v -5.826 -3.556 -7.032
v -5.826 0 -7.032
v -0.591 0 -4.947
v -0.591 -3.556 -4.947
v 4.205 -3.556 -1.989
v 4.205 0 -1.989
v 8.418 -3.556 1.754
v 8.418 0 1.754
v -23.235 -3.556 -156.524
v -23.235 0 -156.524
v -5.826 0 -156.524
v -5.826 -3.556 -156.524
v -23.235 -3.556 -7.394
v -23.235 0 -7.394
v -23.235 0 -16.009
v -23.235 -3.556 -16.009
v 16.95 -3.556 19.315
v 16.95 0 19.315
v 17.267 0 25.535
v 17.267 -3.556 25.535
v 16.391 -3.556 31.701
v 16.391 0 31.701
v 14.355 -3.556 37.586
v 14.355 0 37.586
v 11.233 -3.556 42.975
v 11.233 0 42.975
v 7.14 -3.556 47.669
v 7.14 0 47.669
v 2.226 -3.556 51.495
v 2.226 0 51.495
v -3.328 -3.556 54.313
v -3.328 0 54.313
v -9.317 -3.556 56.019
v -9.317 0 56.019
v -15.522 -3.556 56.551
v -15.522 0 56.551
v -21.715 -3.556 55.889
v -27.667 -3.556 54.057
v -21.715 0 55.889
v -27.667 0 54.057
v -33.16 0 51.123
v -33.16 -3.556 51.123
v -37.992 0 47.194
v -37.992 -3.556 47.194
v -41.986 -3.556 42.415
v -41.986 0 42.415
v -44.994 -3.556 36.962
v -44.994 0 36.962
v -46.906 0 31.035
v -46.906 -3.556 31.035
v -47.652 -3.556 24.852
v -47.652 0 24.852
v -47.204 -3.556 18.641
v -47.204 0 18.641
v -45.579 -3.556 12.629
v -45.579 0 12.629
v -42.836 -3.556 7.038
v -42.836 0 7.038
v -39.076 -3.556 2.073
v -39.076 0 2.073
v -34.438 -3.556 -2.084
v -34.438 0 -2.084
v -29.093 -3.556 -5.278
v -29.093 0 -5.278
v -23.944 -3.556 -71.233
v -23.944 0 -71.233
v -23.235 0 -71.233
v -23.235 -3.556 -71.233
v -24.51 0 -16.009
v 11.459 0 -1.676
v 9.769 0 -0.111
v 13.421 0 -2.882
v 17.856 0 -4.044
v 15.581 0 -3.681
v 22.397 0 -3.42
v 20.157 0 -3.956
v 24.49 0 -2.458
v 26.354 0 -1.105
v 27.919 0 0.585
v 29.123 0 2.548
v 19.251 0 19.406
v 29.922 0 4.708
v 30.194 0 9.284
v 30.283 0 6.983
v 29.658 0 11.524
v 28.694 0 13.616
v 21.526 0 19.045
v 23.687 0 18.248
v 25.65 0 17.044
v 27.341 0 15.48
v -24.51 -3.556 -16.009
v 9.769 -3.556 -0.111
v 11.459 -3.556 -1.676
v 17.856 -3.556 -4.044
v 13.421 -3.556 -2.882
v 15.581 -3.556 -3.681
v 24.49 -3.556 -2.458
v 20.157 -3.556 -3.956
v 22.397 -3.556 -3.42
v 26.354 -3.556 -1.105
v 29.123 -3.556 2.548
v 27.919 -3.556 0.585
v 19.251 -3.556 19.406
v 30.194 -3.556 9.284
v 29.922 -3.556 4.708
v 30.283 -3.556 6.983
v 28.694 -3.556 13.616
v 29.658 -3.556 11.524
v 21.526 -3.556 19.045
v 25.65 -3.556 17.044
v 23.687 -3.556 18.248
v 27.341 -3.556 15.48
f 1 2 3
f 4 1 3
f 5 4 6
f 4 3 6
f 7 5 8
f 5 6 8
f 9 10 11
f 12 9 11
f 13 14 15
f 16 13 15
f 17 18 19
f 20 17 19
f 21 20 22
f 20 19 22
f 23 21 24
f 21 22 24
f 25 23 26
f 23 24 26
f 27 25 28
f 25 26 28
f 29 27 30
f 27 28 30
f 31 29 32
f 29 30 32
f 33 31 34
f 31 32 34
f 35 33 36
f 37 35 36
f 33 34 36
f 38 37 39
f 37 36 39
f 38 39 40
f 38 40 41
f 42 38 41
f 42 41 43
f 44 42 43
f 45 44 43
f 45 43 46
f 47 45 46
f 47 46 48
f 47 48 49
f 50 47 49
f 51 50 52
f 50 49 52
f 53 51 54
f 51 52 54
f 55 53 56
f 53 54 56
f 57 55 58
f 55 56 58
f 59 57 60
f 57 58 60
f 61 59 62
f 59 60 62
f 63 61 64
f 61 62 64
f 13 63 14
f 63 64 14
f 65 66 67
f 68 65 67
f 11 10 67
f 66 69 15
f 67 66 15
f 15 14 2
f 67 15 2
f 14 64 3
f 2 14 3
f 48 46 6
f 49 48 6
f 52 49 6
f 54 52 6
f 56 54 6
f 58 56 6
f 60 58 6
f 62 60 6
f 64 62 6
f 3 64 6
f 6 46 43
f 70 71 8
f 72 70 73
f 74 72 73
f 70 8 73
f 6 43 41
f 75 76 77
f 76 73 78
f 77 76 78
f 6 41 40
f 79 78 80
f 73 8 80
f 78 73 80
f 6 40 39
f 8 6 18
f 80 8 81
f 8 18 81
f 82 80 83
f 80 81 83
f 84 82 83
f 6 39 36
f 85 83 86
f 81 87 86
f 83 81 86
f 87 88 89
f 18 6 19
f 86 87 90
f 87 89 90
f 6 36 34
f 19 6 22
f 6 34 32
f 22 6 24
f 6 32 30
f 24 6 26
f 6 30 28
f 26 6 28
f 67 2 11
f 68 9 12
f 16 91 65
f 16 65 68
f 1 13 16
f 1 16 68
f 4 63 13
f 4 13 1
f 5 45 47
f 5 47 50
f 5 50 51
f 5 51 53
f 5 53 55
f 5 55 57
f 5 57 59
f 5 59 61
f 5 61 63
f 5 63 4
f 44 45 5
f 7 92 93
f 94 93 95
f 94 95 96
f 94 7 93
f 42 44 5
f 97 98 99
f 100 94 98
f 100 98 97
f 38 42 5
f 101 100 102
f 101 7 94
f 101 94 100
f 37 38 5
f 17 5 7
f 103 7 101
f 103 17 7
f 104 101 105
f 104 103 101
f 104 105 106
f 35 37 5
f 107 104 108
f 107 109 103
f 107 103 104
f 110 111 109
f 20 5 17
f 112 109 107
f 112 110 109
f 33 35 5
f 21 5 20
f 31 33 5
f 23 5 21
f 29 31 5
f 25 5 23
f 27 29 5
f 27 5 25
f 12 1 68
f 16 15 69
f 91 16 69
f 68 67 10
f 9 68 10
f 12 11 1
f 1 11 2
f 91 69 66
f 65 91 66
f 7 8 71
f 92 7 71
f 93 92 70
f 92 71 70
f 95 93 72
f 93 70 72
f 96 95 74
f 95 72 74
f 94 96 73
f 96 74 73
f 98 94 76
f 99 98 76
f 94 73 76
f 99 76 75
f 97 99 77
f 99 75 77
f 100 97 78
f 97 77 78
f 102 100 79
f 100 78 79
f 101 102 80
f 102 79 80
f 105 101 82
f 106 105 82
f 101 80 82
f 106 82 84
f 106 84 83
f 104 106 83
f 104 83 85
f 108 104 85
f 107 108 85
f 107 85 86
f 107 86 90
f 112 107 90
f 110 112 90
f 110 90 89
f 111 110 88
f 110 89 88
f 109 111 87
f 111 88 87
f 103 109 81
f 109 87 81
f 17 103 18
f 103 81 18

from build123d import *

# Parameters (mm, degrees)
F1_DEPTH = 3.556


with BuildPart() as f1:
    # F0 (on Front) → F1 (new body)
    with BuildSketch(Plane.XZ):
        with BuildLine():
            Line((-5.826374, -156.523644), (-5.826374, -7.032426))
            ThreePointArc((-5.826374, -7.032426), (1.871411, -3.572466), (8.417938, 1.753902))
            ThreePointArc((8.417938, 1.753902), (29.123373, 2.547832), (16.949844, 19.315377))
            ThreePointArc((16.949844, 19.315377), (-33.159966, 51.122593), (-23.235221, -7.393999))
            Line((-23.235221, -7.393999), (-23.235221, -16.009105))
            Line((-23.235221, -16.009105), (-24.5104, -16.009105))
            Line((-24.5104, -16.009105), (-23.943633, -71.23325))
            Line((-23.943633, -71.23325), (-23.235221, -71.23325))
            Line((-23.235221, -71.23325), (-23.235221, -140.258765))
            Line((-23.235221, -140.258765), (-23.235221, -156.523644))
            Line((-23.235221, -156.523644), (-5.826374, -156.523644))
        make_face()
    extrude(amount=F1_DEPTH)


solid = f1.part
